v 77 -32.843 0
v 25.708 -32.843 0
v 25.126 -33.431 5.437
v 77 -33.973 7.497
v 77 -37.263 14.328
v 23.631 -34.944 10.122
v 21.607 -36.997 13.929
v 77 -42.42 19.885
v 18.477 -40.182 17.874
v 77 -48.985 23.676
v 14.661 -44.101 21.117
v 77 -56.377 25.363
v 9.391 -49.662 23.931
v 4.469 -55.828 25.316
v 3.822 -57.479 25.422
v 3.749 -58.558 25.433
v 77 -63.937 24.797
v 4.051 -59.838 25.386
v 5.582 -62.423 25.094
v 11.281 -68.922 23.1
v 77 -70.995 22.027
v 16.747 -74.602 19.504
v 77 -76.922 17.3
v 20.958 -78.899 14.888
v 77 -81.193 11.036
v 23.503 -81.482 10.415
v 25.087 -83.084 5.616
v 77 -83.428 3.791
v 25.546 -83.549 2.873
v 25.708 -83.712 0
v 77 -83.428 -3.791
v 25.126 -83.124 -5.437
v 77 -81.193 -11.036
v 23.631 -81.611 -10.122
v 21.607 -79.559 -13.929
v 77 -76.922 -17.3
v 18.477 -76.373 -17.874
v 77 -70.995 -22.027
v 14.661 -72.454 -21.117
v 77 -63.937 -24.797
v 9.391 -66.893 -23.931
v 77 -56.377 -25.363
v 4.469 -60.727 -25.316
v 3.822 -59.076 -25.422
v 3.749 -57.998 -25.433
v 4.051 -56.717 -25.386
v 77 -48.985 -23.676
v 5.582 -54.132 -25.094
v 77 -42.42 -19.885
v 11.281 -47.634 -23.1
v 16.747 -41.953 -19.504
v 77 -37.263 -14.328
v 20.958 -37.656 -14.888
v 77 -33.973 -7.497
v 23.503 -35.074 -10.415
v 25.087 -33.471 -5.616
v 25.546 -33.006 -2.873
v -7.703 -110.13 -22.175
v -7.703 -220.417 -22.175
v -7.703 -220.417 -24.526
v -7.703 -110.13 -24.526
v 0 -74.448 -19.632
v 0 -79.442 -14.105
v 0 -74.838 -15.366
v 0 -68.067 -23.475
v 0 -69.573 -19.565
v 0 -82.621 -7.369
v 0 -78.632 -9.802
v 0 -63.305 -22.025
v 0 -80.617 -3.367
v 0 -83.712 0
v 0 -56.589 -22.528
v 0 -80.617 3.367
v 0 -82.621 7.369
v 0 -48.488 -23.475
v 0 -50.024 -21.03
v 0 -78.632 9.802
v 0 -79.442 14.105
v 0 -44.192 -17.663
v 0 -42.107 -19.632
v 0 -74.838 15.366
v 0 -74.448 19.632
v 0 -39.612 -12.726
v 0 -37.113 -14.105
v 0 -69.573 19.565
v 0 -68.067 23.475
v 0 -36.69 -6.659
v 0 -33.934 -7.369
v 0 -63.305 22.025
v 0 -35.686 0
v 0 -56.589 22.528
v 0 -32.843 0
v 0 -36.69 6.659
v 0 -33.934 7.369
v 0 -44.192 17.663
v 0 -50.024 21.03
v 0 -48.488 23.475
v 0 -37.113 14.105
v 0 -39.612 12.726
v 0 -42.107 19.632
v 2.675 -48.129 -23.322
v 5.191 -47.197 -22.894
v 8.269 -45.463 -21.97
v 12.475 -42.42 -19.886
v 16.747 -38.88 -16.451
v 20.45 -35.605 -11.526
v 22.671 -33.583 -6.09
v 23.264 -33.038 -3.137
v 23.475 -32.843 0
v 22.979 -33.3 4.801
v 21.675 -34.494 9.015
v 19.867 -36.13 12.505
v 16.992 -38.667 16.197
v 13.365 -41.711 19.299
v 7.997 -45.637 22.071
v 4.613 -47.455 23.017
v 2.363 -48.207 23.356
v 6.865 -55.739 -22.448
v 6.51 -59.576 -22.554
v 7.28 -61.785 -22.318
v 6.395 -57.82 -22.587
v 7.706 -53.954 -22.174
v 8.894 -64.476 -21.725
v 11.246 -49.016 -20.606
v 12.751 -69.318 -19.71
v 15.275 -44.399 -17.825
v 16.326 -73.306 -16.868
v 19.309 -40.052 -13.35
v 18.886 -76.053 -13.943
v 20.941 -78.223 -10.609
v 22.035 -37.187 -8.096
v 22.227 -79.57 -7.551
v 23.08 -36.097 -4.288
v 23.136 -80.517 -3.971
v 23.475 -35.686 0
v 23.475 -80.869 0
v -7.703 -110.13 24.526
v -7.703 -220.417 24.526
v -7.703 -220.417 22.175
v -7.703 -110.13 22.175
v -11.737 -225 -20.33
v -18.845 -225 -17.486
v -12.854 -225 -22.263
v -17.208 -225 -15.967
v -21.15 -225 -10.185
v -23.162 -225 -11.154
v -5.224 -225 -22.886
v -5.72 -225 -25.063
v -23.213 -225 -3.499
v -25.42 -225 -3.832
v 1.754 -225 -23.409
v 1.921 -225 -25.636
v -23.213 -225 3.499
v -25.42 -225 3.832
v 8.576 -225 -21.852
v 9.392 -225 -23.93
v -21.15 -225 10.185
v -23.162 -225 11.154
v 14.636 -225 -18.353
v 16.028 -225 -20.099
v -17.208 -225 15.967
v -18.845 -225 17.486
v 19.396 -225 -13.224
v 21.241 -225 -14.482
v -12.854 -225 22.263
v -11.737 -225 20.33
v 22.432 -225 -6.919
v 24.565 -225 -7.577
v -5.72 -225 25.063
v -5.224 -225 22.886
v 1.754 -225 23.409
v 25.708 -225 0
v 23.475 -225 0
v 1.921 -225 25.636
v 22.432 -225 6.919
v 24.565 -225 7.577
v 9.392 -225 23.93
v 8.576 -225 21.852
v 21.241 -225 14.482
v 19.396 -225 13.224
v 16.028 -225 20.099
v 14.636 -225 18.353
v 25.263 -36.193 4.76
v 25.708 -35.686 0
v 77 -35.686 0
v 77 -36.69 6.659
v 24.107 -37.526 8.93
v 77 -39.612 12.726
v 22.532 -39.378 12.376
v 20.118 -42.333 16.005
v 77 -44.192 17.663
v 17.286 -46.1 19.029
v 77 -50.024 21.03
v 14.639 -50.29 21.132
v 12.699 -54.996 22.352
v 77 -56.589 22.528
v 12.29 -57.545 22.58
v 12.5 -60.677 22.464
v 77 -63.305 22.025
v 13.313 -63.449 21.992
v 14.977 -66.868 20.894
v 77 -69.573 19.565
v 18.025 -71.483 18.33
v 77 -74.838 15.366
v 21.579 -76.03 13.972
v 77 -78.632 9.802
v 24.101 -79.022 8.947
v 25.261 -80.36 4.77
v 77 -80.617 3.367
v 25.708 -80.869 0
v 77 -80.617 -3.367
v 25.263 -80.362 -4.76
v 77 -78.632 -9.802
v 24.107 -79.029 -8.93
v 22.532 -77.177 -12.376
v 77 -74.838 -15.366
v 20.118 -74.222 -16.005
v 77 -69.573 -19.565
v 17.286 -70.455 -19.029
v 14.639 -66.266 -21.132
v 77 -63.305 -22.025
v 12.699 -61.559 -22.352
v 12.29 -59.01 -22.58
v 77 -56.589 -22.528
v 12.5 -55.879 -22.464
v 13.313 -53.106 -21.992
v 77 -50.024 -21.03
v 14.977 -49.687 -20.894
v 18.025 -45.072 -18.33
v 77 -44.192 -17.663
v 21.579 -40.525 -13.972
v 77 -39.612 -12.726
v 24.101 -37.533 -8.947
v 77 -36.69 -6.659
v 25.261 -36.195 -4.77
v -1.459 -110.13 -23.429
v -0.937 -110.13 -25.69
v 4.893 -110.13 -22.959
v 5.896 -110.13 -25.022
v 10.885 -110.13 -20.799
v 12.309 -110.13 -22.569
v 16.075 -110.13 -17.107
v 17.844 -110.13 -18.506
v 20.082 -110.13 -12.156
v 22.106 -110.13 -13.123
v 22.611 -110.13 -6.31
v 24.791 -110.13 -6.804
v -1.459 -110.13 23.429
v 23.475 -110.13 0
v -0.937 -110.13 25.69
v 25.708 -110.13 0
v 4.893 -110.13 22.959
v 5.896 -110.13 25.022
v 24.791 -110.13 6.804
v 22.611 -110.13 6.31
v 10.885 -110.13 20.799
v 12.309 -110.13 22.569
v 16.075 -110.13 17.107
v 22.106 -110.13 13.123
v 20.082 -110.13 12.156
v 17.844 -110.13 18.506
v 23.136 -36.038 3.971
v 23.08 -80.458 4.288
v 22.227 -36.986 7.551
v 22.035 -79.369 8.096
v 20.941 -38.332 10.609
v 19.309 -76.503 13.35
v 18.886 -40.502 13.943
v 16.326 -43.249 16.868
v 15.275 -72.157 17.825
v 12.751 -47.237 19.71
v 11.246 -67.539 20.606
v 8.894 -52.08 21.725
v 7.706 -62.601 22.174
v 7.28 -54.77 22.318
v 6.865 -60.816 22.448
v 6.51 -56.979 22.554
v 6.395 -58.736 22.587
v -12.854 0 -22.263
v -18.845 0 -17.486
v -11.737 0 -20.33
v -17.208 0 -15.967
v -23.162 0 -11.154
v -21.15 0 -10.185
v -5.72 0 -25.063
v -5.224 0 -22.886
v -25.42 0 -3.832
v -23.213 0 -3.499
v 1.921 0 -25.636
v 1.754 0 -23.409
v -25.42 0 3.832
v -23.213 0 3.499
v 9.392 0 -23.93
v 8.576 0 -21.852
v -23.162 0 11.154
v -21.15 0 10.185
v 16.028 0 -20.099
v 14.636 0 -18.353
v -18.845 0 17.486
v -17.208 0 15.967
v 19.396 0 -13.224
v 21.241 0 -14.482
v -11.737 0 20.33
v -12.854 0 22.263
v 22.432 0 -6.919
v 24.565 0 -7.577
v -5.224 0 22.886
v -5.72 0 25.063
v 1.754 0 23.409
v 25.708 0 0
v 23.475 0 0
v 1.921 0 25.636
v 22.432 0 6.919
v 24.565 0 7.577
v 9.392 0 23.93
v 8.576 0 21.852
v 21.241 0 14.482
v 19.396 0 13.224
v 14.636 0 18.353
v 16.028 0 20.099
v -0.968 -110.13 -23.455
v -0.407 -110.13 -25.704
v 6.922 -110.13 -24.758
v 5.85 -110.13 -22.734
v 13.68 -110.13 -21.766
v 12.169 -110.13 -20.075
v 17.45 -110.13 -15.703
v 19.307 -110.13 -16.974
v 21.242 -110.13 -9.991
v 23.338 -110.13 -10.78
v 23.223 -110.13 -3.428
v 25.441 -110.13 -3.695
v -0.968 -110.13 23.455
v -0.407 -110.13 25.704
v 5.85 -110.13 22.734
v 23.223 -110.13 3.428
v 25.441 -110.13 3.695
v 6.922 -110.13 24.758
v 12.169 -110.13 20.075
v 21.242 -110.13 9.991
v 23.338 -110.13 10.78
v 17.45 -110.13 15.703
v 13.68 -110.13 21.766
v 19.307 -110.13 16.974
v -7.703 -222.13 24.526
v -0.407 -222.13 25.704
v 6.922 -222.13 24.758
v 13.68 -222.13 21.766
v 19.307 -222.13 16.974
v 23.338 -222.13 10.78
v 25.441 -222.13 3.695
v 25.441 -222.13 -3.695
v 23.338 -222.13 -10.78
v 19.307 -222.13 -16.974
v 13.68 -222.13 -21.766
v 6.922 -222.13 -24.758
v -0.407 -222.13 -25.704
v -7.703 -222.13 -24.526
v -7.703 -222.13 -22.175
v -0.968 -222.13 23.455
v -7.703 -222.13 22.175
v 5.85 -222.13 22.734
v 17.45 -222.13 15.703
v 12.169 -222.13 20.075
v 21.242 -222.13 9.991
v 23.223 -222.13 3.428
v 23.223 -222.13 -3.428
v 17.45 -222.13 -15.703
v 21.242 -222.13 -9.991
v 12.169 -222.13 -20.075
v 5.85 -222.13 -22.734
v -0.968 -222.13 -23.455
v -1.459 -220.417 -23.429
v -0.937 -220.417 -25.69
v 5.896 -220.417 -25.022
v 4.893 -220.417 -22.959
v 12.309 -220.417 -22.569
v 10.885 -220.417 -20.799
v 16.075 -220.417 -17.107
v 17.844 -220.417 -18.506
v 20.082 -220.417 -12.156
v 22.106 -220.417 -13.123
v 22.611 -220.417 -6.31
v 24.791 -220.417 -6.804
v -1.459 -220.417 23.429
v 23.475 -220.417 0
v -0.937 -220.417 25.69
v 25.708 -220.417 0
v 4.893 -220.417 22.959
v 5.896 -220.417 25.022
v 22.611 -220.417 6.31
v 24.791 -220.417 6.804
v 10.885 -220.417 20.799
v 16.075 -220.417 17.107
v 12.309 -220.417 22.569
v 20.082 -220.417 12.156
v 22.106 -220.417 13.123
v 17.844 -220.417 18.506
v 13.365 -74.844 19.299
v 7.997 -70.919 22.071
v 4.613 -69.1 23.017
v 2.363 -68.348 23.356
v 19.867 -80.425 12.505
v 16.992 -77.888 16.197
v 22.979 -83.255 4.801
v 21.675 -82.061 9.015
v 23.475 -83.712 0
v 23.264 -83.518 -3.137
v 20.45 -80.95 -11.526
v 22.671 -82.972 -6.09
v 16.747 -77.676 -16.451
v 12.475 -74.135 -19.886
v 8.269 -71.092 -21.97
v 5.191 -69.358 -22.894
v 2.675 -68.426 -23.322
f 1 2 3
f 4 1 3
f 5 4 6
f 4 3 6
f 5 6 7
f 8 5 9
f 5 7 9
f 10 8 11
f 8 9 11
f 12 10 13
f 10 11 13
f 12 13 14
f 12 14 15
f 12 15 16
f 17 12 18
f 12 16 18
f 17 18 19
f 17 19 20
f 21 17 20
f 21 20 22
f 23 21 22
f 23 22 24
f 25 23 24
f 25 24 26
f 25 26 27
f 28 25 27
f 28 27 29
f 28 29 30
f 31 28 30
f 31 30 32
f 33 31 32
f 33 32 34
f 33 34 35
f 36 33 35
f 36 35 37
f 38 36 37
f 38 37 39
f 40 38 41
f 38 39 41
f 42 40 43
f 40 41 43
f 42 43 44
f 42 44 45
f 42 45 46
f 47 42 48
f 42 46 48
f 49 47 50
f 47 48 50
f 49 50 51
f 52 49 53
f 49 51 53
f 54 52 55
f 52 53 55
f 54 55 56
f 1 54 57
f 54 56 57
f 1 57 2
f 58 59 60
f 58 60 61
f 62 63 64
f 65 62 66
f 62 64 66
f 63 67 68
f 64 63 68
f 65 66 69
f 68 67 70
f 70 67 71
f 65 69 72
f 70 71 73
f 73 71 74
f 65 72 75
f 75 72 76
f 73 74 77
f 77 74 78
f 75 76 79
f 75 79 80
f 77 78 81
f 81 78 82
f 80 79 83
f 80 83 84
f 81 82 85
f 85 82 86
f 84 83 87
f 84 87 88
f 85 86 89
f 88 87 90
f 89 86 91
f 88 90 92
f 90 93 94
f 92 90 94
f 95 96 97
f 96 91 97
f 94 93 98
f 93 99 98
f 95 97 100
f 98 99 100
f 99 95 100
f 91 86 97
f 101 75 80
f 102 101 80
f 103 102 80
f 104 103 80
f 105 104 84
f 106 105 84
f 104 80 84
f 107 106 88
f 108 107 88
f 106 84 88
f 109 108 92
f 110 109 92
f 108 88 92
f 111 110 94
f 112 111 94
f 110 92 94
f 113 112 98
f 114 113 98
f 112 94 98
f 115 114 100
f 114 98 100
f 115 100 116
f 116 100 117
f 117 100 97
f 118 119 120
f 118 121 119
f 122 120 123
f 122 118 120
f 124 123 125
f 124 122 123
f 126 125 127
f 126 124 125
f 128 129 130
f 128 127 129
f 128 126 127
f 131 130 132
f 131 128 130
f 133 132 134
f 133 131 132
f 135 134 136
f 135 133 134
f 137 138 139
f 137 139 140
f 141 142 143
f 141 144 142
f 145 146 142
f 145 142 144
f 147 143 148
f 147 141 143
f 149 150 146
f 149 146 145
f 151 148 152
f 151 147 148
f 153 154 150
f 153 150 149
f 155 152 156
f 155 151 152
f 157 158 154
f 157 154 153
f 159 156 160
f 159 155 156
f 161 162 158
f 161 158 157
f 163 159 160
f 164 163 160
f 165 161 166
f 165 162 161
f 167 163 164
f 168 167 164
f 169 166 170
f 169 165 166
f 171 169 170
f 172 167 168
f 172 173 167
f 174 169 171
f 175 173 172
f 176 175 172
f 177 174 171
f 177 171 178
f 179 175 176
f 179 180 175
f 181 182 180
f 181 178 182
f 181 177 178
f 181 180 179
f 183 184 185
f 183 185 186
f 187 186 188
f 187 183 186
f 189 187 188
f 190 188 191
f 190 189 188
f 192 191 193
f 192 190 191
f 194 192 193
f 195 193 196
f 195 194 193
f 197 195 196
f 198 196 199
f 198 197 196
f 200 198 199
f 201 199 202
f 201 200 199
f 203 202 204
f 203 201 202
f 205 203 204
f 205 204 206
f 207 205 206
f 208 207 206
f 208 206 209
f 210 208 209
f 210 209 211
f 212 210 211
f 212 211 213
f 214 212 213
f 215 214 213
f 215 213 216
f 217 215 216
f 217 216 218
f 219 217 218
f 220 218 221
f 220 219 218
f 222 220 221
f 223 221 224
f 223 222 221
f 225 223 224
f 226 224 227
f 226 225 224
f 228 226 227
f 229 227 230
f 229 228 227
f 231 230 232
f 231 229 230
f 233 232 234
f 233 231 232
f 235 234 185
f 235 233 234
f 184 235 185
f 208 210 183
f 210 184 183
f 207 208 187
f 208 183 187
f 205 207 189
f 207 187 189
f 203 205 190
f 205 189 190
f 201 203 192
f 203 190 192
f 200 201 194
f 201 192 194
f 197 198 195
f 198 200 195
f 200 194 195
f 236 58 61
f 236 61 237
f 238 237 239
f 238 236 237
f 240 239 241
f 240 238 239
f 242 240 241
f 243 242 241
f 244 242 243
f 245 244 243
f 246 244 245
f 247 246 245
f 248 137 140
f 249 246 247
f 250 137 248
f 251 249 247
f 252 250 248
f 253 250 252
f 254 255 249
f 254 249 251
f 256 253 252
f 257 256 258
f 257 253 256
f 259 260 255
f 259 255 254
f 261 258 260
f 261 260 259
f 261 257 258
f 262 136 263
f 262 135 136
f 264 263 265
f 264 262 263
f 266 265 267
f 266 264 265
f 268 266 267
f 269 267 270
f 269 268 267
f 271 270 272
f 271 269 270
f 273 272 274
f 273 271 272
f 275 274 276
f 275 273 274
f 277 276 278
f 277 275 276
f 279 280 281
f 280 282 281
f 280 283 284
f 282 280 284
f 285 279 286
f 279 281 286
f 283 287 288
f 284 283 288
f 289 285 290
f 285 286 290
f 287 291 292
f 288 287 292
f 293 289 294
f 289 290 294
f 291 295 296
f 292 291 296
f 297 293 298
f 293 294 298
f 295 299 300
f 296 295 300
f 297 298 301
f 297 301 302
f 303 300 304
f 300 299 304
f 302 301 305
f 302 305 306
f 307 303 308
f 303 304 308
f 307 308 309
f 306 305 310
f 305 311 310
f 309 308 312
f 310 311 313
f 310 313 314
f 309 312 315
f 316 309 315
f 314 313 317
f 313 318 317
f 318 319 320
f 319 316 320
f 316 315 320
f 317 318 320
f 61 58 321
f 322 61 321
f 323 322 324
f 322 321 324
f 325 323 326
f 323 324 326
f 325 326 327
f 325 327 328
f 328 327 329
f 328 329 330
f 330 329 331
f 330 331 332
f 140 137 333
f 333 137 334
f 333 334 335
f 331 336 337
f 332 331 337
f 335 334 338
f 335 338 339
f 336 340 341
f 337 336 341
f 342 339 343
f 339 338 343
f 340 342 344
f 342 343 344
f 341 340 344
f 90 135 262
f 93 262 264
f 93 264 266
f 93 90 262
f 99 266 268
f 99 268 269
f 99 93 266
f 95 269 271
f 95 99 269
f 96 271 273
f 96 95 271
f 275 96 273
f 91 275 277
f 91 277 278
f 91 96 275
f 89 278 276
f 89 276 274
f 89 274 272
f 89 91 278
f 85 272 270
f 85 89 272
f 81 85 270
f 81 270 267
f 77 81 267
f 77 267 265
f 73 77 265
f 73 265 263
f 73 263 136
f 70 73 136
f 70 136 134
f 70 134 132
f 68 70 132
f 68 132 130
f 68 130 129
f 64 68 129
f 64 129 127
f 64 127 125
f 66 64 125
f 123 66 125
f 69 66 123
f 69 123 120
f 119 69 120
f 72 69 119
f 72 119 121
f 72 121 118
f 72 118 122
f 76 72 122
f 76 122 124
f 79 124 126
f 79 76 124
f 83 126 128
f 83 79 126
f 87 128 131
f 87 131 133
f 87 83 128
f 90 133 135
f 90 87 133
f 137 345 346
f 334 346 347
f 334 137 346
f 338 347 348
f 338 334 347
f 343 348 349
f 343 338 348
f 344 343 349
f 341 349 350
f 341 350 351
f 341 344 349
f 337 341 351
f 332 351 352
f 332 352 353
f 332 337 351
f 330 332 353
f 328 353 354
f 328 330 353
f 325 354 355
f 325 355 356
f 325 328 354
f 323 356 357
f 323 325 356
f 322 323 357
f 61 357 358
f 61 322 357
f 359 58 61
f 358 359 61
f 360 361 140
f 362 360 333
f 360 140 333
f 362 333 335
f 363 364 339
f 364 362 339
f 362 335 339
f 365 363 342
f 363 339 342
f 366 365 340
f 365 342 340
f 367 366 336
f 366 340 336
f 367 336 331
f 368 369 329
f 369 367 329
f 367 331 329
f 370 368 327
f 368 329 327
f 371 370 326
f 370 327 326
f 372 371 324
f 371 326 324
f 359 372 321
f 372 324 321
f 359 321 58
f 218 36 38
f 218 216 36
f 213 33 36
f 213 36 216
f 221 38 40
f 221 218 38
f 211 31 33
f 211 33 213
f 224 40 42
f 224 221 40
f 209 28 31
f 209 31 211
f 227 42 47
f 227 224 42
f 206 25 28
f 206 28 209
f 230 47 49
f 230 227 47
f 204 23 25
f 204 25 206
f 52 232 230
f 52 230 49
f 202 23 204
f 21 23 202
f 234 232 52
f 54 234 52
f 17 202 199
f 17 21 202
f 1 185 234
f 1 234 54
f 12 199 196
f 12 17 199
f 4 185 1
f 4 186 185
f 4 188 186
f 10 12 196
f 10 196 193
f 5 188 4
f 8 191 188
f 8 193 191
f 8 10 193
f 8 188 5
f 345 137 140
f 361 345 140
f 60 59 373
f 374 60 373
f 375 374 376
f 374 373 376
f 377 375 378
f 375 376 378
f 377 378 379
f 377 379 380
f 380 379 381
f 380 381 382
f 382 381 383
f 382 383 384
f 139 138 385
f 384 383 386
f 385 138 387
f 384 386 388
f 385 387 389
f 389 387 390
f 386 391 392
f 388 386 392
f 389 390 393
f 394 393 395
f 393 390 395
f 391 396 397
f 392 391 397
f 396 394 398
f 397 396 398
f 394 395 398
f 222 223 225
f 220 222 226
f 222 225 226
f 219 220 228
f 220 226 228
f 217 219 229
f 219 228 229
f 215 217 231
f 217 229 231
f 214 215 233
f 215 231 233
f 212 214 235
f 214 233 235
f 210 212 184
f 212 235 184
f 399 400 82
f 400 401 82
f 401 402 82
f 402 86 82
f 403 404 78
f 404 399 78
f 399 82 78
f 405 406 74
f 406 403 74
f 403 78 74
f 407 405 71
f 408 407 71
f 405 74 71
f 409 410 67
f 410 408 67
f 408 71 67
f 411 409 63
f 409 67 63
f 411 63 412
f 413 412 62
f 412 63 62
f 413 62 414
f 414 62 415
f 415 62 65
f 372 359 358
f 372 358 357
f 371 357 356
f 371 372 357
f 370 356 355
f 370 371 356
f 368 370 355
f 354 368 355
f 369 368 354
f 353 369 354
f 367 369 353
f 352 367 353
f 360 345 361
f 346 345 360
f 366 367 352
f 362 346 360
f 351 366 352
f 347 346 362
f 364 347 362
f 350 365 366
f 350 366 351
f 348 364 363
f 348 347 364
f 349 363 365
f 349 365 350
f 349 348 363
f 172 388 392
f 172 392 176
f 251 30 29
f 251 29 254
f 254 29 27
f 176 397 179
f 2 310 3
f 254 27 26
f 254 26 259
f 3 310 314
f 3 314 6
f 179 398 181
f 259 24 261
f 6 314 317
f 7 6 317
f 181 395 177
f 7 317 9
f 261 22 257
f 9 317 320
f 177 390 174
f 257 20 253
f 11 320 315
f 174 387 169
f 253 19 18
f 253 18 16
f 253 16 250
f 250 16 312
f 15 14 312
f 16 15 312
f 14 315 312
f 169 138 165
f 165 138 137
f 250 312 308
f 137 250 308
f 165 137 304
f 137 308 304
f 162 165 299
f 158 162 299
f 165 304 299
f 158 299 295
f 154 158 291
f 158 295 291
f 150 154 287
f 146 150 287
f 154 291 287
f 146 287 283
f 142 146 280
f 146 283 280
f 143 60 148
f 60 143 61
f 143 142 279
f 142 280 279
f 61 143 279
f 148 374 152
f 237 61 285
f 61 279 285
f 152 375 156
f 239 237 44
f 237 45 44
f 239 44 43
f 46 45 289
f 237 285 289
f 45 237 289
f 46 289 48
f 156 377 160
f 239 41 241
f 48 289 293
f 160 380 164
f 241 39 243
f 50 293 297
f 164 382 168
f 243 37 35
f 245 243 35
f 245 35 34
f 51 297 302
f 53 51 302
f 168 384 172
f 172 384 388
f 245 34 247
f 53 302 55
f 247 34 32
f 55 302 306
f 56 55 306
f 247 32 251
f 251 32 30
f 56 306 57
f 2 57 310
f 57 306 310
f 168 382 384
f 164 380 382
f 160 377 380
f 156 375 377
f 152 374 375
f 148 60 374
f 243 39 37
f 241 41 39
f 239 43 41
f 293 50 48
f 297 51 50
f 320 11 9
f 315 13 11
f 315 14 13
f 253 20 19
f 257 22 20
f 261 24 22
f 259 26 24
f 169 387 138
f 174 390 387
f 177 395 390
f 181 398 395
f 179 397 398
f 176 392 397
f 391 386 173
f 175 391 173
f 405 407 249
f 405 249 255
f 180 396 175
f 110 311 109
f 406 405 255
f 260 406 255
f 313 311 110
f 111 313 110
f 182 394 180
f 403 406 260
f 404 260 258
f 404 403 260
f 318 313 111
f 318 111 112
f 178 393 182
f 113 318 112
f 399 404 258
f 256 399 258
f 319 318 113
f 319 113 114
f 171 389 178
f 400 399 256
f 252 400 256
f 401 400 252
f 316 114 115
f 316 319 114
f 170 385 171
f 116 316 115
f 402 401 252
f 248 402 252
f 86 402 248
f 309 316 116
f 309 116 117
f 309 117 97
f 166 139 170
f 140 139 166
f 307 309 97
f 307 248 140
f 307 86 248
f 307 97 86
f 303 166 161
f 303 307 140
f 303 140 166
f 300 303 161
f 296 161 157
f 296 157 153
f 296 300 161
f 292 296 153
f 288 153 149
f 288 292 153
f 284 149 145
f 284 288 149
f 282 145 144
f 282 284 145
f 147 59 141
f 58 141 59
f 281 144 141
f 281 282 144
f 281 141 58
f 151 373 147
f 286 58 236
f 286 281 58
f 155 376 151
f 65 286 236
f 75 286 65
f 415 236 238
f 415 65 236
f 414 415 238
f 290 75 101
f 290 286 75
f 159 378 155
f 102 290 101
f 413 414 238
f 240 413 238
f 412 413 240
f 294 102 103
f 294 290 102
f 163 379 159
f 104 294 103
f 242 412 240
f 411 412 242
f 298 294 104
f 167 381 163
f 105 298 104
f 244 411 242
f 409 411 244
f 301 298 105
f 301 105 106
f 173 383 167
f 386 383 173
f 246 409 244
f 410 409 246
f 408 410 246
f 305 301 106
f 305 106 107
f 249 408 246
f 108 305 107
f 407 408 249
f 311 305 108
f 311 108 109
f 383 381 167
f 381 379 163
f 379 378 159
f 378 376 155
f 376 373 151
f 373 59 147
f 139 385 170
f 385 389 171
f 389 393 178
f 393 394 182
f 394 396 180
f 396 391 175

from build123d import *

# Parameters (mm, degrees)
F0_R     = 25.7075351744
F0_R_2   = 23.4747624904
F1_DEPTH = 114
F2_R     = 25.4343017655
F2_R_2   = 22.5914551843
F3_DEPTH = 77
F4_DEPTH = 111
F5_W     = 45.2958606184
F5_H     = 110.2872118354
F6_DEPTH = 50
F7_DEPTH = 112


with BuildPart() as f1:
    # F0 (on Front) → F1 (new body)
    with BuildSketch(Plane.XZ):
        Circle(F0_R)
        Circle(F0_R_2, mode=Mode.SUBTRACT)
    extrude(amount=F1_DEPTH)

    # F2 (on Right) → F3 (join)
    with BuildSketch(Plane.YZ):
        with Locations((-58.2775846124, 0)):
            Circle(F2_R)
        with Locations((-58.2775846124, 0)):
            Circle(F2_R_2, mode=Mode.SUBTRACT)
    extrude(amount=F3_DEPTH)

    # F4 (add): a face of the model
    f4_faces = [f1.faces().sort_by_distance(p)[0] for p in [
        (-24.9804162765, -114, 0),
    ]]
    extrude(f4_faces, amount=F4_DEPTH)

    # F5 (on Top) → F6 (cut, symmetric)
    with BuildSketch(Plane.XY):
        with Locations((14.944491908, -165.2734465897)):
            Rectangle(F5_W, F5_H)
    extrude(amount=F6_DEPTH, both=True, mode=Mode.SUBTRACT)


with BuildPart() as f7:
    # F7 (new): a face of the model
    f7_faces = [f1.part.faces().sort_by_distance(p)[0] for p in [
        (14.8496639637, -110.129840672, -20.2290515983),
    ]]
    extrude(f7_faces, amount=F7_DEPTH)


solid = Compound([f1.part, f7.part])
